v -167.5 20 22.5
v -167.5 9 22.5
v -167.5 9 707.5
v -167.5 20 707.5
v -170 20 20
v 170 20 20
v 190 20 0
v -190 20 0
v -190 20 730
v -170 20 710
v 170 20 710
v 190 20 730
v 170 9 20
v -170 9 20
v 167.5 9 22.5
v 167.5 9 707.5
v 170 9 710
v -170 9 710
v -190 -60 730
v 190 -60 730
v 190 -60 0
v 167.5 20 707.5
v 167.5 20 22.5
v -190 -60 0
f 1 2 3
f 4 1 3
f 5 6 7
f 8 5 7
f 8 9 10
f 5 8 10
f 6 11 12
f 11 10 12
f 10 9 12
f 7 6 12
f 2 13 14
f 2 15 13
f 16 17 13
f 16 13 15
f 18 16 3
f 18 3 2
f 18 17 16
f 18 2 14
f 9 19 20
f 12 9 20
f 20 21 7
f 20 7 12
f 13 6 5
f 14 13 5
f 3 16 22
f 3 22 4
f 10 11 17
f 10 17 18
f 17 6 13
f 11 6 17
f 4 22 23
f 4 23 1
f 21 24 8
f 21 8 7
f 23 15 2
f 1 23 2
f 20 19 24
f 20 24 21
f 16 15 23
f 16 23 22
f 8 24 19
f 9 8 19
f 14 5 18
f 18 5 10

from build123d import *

# Parameters (mm, degrees)
SKETCH1_W           = 380
SKETCH1_H           = 730
BOSS_EXTRUDE1_DEPTH = 80
SKETCH2_W           = 340
SKETCH2_H           = 690
CUT_EXTRUDE1_DEPTH  = 11
SKETCH3_W           = 335
SKETCH3_H           = 685
BOSS_EXTRUDE2_DEPTH = 11


with BuildPart() as part:
    # Sketch1 → Boss-Extrude1 (new body)
    with BuildSketch(Plane.XZ.offset(60)):
        with Locations((0, 365)):
            Rectangle(SKETCH1_W, SKETCH1_H)
    extrude(amount=-BOSS_EXTRUDE1_DEPTH)

    # Sketch2 → Cut-Extrude1 (cut)
    with BuildSketch(Plane(origin=(0, 20, 0), x_dir=(-1, 0, 0), z_dir=(0, 1, 0))):
        with Locations((0, 365)):
            Rectangle(SKETCH2_W, SKETCH2_H)
    extrude(amount=-CUT_EXTRUDE1_DEPTH, mode=Mode.SUBTRACT)

    # Sketch3 → Boss-Extrude2 (add)
    with BuildSketch(Plane(origin=(0, 9, 0), x_dir=(-1, 0, 0), z_dir=(0, 1, 0))):
        with Locations((0, 365)):
            Rectangle(SKETCH3_W, SKETCH3_H)
    extrude(amount=BOSS_EXTRUDE2_DEPTH)


solid = part.part
